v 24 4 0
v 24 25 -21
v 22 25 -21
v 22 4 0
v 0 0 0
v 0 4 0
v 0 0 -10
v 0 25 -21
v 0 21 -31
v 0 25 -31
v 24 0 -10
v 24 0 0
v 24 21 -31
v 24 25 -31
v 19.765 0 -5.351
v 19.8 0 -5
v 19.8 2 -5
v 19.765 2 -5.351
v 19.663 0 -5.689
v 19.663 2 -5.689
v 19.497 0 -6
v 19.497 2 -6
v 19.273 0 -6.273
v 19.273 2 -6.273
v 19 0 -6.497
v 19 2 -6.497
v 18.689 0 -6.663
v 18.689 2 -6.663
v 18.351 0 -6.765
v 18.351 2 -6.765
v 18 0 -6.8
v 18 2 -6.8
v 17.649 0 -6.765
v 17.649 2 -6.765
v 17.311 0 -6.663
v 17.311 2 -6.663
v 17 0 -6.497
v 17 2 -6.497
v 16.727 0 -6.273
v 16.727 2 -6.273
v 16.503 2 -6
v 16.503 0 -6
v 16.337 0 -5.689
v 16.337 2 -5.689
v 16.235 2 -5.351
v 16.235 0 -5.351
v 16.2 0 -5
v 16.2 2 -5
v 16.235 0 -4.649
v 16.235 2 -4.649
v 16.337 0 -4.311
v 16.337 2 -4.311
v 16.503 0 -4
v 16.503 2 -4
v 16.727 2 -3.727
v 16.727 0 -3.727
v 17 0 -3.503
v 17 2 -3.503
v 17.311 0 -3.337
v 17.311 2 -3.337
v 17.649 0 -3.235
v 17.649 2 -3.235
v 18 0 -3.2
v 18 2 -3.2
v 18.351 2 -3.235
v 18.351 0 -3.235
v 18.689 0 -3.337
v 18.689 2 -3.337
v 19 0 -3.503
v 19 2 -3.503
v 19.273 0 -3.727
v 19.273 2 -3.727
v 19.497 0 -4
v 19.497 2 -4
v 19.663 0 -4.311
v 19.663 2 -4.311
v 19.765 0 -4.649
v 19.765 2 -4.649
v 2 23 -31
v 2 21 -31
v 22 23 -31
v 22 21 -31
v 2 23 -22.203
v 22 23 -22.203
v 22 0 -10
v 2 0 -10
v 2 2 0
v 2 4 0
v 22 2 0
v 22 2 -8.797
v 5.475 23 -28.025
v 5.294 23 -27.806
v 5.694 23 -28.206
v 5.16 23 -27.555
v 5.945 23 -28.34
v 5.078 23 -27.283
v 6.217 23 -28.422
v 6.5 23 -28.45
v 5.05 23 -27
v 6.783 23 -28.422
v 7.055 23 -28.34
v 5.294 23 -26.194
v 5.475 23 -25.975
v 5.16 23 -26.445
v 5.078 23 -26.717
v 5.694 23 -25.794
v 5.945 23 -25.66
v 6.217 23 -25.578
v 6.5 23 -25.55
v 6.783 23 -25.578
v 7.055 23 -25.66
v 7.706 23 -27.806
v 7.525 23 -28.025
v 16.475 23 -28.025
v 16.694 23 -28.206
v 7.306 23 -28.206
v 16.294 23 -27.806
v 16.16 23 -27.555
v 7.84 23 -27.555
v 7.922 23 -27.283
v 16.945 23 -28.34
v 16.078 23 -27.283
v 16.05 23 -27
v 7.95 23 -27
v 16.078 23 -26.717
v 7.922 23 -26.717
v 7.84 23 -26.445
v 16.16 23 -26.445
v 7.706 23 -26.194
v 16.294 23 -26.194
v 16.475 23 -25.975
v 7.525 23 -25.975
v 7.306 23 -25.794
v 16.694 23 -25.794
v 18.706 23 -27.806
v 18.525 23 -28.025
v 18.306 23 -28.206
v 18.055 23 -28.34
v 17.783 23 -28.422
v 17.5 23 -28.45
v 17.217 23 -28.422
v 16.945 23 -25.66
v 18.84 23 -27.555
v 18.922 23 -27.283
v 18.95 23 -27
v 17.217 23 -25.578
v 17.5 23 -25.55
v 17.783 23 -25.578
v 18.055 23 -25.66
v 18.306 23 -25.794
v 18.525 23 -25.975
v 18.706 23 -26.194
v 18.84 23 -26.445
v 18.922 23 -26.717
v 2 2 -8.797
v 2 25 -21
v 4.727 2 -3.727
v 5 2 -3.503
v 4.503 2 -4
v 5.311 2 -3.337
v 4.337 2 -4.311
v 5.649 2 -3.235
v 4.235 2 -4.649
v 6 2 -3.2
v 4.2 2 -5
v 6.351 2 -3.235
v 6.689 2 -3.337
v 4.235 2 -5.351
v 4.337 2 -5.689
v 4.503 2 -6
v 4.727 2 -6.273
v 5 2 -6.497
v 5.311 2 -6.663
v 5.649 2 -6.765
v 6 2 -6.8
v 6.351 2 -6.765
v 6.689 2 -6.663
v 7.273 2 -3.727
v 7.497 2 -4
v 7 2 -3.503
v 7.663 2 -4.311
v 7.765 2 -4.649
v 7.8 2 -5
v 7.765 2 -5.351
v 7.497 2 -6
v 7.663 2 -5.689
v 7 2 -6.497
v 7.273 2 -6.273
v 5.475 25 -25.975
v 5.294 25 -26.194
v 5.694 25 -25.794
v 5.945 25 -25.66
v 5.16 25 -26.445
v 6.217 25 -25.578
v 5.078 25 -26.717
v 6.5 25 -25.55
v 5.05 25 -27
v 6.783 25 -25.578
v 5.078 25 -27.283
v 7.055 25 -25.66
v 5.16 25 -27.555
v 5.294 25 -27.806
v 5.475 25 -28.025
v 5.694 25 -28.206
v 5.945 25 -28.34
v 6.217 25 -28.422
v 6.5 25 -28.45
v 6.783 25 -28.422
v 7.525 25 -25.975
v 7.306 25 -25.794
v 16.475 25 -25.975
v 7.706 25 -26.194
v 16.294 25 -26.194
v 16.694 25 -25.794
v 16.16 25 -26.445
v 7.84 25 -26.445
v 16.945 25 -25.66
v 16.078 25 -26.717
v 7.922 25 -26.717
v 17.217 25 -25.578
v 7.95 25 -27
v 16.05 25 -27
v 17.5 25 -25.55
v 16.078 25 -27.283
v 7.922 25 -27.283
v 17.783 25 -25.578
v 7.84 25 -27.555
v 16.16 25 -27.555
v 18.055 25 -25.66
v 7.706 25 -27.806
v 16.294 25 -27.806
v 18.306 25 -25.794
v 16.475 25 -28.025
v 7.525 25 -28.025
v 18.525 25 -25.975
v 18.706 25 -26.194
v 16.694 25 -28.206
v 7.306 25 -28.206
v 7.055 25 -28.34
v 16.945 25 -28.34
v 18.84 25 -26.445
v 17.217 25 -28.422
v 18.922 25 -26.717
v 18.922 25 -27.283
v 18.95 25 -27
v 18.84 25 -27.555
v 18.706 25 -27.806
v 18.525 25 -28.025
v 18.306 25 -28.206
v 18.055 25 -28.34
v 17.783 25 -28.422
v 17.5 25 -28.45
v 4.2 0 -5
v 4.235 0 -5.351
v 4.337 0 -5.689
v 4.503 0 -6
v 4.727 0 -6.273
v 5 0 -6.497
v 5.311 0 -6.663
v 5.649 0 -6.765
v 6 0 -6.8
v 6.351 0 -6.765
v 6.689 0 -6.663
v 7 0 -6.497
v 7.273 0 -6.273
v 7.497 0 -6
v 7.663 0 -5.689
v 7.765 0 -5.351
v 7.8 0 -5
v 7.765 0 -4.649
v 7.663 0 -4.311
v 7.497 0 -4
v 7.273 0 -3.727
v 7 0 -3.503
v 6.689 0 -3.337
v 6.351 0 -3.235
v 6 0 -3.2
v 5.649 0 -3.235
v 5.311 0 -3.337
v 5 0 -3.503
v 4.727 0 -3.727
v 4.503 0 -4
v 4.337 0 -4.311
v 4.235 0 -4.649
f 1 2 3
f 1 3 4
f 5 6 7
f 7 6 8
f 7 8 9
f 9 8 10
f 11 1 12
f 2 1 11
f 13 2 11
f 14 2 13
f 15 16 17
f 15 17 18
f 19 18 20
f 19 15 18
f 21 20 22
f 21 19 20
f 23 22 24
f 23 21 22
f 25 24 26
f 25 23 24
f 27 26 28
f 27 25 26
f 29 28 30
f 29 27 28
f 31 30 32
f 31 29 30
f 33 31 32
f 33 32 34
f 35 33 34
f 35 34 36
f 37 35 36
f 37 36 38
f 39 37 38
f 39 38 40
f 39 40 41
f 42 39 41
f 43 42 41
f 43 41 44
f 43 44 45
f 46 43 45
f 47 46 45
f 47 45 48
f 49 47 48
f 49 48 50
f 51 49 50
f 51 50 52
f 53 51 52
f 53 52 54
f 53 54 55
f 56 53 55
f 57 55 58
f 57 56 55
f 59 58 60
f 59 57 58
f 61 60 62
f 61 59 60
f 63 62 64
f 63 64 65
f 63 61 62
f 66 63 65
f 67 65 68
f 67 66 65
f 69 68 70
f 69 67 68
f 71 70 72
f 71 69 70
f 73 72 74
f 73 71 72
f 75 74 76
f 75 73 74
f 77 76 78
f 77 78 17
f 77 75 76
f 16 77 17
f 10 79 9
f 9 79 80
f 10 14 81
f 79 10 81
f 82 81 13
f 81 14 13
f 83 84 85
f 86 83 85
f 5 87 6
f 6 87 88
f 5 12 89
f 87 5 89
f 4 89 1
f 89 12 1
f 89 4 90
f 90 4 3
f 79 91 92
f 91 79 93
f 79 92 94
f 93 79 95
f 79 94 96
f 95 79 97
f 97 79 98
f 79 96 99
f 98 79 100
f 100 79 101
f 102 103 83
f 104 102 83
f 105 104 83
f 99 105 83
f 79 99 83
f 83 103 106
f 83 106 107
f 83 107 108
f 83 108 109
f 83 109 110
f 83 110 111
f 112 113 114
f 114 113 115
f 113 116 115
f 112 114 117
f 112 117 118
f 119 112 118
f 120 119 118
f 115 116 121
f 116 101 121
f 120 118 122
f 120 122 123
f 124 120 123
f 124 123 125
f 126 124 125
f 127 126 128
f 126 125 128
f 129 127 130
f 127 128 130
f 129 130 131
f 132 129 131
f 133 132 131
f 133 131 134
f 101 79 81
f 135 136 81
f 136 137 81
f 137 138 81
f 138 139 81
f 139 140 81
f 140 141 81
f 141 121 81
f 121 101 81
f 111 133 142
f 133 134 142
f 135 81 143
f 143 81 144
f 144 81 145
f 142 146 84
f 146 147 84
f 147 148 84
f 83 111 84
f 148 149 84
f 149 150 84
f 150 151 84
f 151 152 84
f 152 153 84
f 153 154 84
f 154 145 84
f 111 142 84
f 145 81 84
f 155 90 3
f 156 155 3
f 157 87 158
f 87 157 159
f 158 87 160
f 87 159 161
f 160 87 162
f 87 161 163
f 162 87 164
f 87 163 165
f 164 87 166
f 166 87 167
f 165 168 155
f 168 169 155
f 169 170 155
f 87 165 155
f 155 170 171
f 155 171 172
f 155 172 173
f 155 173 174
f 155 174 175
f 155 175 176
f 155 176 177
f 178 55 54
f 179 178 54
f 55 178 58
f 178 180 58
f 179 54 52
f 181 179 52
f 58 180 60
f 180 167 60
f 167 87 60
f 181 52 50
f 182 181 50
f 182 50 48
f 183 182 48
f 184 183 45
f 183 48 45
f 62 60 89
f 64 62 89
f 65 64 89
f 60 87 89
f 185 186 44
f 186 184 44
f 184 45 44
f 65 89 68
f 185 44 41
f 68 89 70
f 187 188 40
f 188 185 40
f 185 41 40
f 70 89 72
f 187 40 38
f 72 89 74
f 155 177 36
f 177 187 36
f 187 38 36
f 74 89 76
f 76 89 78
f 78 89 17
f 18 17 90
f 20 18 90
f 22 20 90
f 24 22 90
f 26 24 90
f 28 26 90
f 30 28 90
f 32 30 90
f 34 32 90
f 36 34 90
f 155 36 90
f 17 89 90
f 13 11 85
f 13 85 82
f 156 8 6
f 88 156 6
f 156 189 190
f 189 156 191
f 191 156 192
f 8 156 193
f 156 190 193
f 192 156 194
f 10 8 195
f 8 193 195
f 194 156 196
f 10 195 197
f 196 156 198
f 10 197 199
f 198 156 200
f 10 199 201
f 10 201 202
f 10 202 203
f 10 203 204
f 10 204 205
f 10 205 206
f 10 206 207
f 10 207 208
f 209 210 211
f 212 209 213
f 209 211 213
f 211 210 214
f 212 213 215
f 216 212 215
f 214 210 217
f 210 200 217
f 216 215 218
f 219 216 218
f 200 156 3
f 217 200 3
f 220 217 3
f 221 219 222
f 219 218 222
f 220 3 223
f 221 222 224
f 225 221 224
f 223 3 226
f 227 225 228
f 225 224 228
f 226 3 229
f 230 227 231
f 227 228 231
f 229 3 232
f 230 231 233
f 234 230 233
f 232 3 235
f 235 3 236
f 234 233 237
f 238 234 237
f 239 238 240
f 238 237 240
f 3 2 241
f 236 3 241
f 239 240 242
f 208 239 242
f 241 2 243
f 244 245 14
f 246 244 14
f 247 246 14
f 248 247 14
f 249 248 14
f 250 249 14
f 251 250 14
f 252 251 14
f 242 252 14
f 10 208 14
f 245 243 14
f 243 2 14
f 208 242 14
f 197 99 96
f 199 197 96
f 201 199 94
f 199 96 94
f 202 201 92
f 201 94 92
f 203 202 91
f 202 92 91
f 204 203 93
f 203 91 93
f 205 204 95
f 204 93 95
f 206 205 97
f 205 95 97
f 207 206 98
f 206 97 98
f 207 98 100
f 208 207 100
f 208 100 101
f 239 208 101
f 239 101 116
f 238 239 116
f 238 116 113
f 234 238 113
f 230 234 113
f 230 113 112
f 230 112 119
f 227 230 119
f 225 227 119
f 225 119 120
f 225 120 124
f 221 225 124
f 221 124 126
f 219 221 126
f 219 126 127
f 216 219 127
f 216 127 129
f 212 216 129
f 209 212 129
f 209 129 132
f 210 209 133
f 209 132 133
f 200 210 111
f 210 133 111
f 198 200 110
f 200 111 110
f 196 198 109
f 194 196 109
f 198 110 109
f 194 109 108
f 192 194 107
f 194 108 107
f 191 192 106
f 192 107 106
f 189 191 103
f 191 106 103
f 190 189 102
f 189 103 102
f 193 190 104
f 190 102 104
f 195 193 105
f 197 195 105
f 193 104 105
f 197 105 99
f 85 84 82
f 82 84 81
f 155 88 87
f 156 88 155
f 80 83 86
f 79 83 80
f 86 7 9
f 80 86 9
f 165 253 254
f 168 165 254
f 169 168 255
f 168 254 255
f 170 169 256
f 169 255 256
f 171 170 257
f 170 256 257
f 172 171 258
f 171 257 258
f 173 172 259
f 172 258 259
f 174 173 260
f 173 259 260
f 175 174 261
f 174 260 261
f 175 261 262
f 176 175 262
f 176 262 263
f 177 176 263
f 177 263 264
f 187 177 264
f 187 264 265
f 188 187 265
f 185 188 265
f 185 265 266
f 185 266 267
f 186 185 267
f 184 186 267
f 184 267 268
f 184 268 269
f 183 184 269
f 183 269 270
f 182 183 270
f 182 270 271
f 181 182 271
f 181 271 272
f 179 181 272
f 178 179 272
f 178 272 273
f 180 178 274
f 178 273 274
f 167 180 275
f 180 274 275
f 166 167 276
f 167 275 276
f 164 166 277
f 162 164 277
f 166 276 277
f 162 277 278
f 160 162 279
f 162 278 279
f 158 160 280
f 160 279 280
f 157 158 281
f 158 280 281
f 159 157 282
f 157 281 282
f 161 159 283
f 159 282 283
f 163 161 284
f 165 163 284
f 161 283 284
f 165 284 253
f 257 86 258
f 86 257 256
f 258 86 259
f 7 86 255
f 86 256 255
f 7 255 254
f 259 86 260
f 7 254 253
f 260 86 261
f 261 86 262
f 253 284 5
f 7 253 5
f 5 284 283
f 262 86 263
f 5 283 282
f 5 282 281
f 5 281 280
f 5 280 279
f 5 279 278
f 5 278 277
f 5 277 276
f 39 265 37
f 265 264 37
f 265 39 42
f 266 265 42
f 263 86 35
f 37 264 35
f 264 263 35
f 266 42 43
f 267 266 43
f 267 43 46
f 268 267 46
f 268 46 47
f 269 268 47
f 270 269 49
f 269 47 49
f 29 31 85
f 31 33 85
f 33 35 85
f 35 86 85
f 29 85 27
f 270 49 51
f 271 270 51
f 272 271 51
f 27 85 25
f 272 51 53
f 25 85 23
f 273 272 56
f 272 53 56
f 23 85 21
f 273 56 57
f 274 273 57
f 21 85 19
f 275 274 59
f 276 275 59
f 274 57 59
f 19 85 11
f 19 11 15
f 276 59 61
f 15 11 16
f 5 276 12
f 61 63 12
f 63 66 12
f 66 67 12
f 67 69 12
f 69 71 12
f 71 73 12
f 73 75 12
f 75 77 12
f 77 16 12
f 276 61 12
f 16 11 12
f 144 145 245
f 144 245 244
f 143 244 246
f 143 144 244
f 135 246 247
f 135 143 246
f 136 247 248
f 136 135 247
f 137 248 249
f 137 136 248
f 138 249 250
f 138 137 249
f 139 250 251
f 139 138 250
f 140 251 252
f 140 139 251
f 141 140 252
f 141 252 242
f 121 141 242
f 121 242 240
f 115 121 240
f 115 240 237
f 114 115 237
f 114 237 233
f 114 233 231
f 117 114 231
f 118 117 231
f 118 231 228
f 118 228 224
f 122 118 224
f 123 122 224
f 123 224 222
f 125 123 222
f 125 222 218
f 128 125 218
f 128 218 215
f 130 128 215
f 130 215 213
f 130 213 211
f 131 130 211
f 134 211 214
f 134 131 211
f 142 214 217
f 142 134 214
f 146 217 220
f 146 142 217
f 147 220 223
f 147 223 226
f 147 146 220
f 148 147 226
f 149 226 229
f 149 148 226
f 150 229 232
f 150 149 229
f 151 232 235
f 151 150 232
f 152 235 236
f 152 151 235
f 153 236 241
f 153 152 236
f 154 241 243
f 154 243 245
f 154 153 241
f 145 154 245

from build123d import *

# Parameters (mm, degrees)
BOSS_EXTRUDE1_DEPTH    = 2
BOSS_EXTRUDE2_DEPTH    = 10
M3_CLEARANCE_HOLE1_D   = 3.6
M2_5_CLEARANCE_HOLE1_D = 2.9


with BuildPart() as part:
    # Sketch1 → Boss-Extrude1 (new body)
    with BuildSketch(Plane(origin=(0, 0, 0), x_dir=(0, 0, -1), z_dir=(1, 0, 0))):
        Polygon((0, 0), (10, 0), (31, 21), (31, 25), (21, 25), (0, 4), align=None)
    extrude(amount=BOSS_EXTRUDE1_DEPTH)

    # Sketch2 → Boss-Extrude2 (add)
    with BuildSketch(Plane(origin=(2, 0, 0), x_dir=(0, 0, -1), z_dir=(1, 0, 0))):
        Polygon((10, 0), (0, 0), (0, 2), (8.797060967, 2), (21, 25), (31, 25), (31, 23), (22.202939033, 23), align=None)
    extrude(amount=BOSS_EXTRUDE2_DEPTH)

    # M3 Clearance Hole1 (through all)
    with Locations(Plane(origin=(0, 2, 0), x_dir=(1, 0, 0), z_dir=(0, 1, 0))):
        with Locations((6, 5)):
            Hole(M3_CLEARANCE_HOLE1_D / 2)

    # M2.5 Clearance Hole1 (through all)
    with Locations(Plane(origin=(0, 25, 0), x_dir=(1, 0, 0), z_dir=(0, 1, 0))):
        with Locations((6.5, 27)):
            Hole(M2_5_CLEARANCE_HOLE1_D / 2)

    # Mirror1: part across plane


with BuildPart() as part_1:
    add(part.part)
    add(part.part.mirror(Plane.ZY.offset(-12)))


solid = part_1.part
